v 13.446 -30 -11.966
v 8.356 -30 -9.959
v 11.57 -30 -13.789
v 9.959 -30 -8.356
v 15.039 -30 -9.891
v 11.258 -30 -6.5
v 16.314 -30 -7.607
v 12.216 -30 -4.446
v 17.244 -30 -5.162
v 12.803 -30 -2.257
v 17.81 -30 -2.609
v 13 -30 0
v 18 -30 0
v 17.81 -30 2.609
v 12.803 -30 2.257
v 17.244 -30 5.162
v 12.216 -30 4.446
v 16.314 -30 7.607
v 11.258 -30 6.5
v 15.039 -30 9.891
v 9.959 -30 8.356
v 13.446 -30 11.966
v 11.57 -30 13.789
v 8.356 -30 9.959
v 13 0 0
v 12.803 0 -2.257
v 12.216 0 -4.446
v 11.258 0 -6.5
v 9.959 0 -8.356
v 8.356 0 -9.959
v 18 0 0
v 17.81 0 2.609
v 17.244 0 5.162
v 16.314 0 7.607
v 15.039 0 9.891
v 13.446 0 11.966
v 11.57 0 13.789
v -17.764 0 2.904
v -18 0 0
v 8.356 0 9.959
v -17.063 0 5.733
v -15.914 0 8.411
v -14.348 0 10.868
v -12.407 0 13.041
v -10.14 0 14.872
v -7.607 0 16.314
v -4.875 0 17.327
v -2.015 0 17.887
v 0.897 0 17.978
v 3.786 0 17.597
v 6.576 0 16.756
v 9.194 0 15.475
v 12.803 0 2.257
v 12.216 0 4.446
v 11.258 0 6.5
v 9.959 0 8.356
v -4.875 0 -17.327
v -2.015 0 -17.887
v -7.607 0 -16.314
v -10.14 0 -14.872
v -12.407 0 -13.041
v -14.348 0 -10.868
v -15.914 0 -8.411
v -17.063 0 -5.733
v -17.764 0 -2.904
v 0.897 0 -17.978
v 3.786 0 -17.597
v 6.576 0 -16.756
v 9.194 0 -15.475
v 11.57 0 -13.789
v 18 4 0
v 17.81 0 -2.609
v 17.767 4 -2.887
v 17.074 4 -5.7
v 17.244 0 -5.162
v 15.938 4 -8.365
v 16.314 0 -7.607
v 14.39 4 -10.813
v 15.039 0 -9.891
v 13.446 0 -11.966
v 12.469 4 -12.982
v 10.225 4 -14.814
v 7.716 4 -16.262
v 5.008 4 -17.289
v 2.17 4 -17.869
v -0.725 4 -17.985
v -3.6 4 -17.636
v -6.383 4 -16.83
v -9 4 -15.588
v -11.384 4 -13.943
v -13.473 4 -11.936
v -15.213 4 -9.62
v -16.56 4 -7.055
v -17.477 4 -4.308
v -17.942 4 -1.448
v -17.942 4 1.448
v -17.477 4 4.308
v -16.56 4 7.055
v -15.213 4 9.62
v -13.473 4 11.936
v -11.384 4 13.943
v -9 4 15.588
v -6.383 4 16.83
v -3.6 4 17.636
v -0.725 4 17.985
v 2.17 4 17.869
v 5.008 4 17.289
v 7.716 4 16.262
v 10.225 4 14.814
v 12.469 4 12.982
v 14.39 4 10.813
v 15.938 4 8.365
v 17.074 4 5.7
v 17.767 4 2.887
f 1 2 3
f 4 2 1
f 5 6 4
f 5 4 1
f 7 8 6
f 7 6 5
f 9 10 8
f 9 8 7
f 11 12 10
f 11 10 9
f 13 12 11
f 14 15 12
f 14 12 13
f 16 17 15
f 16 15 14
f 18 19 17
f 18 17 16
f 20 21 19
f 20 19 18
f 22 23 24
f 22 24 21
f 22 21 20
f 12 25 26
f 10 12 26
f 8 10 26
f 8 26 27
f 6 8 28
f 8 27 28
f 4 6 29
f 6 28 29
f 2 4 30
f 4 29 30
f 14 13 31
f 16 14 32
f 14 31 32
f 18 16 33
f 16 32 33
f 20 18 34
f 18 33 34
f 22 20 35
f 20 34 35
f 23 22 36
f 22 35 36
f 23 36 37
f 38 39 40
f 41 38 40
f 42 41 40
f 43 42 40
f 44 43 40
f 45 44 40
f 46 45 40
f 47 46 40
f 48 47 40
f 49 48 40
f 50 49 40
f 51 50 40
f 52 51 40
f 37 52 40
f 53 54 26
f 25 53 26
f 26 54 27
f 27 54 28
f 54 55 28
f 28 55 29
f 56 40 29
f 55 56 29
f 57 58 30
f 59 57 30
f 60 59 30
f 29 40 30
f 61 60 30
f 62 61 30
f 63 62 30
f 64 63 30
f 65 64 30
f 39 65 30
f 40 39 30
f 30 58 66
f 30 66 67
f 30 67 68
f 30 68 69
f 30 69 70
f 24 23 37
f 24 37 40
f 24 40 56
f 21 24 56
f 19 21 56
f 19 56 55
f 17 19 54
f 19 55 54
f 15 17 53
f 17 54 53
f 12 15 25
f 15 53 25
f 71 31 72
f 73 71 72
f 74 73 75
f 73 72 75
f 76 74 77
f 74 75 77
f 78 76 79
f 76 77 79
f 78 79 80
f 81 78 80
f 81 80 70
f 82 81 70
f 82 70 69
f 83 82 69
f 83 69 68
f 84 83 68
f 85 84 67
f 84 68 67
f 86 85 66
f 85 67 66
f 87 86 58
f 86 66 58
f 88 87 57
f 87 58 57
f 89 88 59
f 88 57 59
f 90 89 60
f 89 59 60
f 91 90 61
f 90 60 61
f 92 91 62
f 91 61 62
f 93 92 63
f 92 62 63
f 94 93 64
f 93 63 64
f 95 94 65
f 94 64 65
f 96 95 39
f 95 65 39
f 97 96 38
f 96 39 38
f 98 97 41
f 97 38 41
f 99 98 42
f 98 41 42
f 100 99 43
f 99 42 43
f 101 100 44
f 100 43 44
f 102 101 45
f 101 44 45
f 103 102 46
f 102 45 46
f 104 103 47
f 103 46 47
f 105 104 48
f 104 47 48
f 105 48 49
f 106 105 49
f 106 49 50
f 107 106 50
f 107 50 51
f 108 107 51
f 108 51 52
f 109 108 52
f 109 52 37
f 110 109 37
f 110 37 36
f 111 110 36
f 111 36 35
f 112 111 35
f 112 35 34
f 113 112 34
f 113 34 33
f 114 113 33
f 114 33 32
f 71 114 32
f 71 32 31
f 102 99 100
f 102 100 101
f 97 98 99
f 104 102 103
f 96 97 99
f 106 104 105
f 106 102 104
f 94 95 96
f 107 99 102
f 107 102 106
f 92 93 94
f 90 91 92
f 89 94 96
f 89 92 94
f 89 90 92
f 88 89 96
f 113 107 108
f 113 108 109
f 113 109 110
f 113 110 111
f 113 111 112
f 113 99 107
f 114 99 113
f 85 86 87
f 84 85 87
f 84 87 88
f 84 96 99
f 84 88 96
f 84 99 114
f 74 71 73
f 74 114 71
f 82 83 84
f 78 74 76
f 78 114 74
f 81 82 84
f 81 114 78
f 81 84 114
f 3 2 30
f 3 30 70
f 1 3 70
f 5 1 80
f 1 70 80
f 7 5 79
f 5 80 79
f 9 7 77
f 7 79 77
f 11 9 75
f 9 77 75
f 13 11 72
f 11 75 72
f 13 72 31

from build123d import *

# Parameters (mm, degrees)
SKIZZE1_R                       = 18
AUFSATZ_LINEAR_AUSTRAGEN1_DEPTH = 4
AUFSATZ_LINEAR_AUSTRAGEN2_DEPTH = 30


with BuildPart() as part:
    # Skizze1 → Aufsatz-Linear austragen1 (new body)
    with BuildSketch(Plane(origin=(0, 0, 0), x_dir=(1, 0, 0), z_dir=(0, 1, 0))):
        Circle(SKIZZE1_R)
    extrude(amount=AUFSATZ_LINEAR_AUSTRAGEN1_DEPTH)

    # Skizze2 → Aufsatz-Linear austragen2 (add)
    with BuildSketch(Plane.XZ):
        with BuildLine():
            Line((11.570176974, 13.788799976), (8.356238926, 9.958577761))
            ThreePointArc((8.356238926, 9.958577761), (11.782001231, 5.494037403), (13, 0))
            ThreePointArc((13, 0), (11.782001231, -5.494037403), (8.356238926, -9.958577761))
            Line((8.356238926, -9.958577761), (11.570176974, -13.788799976))
            ThreePointArc((11.570176974, -13.788799976), (16.313540167, -7.607128711), (18, 0))
            ThreePointArc((18, 0), (16.313540167, 7.607128711), (11.570176974, 13.788799976))
        make_face()
    extrude(amount=AUFSATZ_LINEAR_AUSTRAGEN2_DEPTH)


solid = part.part
